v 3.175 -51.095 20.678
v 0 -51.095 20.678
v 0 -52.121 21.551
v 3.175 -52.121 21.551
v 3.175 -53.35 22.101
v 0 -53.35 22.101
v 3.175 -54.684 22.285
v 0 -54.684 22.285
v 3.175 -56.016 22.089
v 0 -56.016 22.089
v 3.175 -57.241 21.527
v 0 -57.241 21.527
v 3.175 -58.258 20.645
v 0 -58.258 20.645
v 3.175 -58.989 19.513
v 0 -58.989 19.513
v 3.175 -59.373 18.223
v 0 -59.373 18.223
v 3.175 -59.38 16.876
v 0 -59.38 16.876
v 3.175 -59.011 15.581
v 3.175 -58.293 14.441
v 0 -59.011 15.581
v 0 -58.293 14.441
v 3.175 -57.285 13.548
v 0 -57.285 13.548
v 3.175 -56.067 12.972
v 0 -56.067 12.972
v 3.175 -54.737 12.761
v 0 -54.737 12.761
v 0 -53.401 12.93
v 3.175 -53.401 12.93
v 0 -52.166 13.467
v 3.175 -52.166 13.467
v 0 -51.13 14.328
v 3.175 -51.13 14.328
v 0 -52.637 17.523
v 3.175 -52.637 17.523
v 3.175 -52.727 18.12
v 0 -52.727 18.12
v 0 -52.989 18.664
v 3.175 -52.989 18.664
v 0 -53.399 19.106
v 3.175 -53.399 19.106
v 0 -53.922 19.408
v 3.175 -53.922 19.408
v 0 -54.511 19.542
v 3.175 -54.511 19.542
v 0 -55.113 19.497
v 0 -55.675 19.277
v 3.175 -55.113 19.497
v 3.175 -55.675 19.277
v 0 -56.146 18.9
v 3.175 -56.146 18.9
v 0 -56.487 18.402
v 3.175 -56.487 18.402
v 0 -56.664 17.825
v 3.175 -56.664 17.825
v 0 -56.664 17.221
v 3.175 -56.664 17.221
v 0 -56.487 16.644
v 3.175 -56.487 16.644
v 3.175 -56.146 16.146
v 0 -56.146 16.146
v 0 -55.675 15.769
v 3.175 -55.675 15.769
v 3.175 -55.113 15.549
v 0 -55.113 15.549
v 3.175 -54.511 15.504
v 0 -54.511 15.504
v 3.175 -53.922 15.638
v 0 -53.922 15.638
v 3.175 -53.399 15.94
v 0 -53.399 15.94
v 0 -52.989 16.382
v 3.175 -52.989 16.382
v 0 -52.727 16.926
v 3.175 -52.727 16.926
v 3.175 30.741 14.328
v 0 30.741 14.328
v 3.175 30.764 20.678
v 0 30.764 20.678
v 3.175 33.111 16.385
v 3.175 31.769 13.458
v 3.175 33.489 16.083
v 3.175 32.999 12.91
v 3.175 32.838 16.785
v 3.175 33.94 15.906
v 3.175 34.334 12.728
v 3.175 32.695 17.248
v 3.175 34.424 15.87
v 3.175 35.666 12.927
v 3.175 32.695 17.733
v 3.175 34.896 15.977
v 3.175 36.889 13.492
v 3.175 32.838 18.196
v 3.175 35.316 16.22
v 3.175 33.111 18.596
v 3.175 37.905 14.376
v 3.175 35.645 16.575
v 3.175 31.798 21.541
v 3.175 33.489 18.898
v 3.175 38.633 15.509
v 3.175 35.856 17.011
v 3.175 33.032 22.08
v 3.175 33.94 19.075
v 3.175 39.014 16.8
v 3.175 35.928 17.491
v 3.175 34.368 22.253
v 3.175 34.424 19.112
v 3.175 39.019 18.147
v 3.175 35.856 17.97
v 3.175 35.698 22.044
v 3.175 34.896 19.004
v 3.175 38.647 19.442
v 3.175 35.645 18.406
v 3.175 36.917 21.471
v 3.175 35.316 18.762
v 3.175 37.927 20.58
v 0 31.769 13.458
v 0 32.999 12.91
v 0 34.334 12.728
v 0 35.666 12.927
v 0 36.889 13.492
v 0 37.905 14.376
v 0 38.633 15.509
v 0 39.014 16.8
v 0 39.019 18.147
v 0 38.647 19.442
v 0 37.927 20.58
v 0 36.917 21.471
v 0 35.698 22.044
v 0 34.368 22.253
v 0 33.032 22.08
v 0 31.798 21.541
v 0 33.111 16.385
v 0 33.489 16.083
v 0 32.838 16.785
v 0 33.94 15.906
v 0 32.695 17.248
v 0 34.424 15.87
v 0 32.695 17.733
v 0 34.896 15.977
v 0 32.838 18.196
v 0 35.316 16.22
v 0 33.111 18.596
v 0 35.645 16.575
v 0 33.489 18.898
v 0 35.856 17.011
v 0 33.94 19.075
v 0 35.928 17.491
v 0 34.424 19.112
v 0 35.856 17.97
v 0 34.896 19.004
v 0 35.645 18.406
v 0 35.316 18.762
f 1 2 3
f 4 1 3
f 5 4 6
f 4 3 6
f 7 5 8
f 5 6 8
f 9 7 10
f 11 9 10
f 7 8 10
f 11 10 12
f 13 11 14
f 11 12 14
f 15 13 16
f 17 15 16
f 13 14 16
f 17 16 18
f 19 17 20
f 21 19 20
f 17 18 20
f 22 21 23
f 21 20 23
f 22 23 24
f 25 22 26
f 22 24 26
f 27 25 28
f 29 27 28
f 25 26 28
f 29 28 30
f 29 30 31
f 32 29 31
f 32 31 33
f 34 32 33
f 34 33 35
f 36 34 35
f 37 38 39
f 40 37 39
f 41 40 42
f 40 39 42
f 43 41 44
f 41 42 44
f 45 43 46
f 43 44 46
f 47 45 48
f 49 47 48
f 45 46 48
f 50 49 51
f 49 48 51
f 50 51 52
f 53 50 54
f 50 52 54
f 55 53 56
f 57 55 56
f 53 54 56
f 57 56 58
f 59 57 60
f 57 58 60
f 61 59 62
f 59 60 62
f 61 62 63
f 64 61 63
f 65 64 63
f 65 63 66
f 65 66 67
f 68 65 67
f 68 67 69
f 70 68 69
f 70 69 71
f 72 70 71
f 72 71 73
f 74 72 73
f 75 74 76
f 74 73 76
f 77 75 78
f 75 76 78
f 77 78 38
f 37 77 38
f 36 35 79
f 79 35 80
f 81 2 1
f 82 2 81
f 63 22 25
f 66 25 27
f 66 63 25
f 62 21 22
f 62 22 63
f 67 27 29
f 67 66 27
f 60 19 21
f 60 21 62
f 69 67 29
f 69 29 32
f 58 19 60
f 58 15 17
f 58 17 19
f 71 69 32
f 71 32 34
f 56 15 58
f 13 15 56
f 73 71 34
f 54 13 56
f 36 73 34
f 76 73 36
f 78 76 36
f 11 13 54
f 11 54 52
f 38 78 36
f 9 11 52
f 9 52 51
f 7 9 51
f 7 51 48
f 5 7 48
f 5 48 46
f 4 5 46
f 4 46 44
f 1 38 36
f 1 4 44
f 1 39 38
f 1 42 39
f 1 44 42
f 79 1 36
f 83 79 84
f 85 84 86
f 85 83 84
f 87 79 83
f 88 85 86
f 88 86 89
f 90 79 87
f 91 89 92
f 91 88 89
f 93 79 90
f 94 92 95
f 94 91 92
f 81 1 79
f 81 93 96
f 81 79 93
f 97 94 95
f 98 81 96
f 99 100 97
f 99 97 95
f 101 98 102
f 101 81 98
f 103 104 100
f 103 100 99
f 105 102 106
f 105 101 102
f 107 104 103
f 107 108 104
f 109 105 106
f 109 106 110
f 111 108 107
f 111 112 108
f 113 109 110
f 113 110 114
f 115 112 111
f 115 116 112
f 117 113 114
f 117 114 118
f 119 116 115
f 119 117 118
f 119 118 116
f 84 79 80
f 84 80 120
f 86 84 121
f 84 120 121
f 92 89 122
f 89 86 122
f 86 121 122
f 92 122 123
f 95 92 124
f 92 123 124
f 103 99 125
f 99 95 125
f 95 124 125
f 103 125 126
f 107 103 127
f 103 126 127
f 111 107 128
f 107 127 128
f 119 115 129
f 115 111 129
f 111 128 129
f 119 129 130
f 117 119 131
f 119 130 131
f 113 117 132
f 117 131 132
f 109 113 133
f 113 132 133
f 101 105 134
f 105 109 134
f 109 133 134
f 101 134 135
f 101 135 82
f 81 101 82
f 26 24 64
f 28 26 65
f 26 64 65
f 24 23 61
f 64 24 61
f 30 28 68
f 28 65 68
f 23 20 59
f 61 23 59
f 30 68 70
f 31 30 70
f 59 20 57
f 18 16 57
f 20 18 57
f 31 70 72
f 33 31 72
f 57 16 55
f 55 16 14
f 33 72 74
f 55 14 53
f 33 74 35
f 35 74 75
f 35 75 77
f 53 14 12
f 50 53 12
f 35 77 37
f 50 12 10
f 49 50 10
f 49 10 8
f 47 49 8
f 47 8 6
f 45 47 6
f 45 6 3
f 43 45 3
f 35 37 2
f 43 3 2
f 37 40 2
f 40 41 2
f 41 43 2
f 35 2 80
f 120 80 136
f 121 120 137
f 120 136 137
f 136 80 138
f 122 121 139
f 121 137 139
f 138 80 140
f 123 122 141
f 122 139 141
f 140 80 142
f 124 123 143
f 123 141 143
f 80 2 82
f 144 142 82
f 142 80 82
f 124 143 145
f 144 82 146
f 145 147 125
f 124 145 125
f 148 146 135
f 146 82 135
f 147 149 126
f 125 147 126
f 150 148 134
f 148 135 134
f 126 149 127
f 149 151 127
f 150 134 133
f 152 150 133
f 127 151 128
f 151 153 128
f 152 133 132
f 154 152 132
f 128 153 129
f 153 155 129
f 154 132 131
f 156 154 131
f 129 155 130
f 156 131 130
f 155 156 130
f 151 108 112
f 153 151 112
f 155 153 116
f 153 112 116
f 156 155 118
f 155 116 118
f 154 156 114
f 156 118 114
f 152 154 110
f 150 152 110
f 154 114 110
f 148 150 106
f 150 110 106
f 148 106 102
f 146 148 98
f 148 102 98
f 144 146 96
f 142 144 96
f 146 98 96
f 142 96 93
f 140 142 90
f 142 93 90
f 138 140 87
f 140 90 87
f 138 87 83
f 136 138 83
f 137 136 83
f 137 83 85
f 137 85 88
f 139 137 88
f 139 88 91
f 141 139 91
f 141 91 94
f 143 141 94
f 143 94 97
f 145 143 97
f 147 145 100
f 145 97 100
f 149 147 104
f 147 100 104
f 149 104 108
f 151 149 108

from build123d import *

# Parameters (mm, degrees)
F0_W     = 88.9
F0_H     = 6.35
F1_DEPTH = 3.175
F2_R     = 4.7625
F3_DEPTH = 3.175
F4_R     = 4.7625
F5_DEPTH = 3.175
F6_R     = 2.024984
F6_R_2   = 1.6256
F7_DEPTH = 3.175


with BuildPart() as f1:
    # F0 (on Right) → F1 (new body)
    with BuildSketch(Plane.YZ):
        with Locations((-10.188125, 17.503159)):
            Rectangle(F0_W, F0_H)
    extrude(amount=F1_DEPTH)

    # F2 (on Right) → F3 (join)
    with BuildSketch(Plane.YZ):
        with Locations((-54.662056, 17.522926)):
            Circle(F2_R)
    extrude(amount=F3_DEPTH)

    # F4 (on Right) → F5 (join)
    with BuildSketch(Plane.YZ):
        with Locations((34.302156, 17.490556)):
            Circle(F4_R)
    extrude(amount=F5_DEPTH)

    # F6 (on face) → F7 (cut)
    with BuildSketch(Plane.YZ.offset(3.175)):
        with Locations((-54.662056, 17.522926)):
            Circle(F6_R)
        with Locations((34.302156, 17.490556)):
            Circle(F6_R_2)
    extrude(amount=-F7_DEPTH, mode=Mode.SUBTRACT)


solid = f1.part
